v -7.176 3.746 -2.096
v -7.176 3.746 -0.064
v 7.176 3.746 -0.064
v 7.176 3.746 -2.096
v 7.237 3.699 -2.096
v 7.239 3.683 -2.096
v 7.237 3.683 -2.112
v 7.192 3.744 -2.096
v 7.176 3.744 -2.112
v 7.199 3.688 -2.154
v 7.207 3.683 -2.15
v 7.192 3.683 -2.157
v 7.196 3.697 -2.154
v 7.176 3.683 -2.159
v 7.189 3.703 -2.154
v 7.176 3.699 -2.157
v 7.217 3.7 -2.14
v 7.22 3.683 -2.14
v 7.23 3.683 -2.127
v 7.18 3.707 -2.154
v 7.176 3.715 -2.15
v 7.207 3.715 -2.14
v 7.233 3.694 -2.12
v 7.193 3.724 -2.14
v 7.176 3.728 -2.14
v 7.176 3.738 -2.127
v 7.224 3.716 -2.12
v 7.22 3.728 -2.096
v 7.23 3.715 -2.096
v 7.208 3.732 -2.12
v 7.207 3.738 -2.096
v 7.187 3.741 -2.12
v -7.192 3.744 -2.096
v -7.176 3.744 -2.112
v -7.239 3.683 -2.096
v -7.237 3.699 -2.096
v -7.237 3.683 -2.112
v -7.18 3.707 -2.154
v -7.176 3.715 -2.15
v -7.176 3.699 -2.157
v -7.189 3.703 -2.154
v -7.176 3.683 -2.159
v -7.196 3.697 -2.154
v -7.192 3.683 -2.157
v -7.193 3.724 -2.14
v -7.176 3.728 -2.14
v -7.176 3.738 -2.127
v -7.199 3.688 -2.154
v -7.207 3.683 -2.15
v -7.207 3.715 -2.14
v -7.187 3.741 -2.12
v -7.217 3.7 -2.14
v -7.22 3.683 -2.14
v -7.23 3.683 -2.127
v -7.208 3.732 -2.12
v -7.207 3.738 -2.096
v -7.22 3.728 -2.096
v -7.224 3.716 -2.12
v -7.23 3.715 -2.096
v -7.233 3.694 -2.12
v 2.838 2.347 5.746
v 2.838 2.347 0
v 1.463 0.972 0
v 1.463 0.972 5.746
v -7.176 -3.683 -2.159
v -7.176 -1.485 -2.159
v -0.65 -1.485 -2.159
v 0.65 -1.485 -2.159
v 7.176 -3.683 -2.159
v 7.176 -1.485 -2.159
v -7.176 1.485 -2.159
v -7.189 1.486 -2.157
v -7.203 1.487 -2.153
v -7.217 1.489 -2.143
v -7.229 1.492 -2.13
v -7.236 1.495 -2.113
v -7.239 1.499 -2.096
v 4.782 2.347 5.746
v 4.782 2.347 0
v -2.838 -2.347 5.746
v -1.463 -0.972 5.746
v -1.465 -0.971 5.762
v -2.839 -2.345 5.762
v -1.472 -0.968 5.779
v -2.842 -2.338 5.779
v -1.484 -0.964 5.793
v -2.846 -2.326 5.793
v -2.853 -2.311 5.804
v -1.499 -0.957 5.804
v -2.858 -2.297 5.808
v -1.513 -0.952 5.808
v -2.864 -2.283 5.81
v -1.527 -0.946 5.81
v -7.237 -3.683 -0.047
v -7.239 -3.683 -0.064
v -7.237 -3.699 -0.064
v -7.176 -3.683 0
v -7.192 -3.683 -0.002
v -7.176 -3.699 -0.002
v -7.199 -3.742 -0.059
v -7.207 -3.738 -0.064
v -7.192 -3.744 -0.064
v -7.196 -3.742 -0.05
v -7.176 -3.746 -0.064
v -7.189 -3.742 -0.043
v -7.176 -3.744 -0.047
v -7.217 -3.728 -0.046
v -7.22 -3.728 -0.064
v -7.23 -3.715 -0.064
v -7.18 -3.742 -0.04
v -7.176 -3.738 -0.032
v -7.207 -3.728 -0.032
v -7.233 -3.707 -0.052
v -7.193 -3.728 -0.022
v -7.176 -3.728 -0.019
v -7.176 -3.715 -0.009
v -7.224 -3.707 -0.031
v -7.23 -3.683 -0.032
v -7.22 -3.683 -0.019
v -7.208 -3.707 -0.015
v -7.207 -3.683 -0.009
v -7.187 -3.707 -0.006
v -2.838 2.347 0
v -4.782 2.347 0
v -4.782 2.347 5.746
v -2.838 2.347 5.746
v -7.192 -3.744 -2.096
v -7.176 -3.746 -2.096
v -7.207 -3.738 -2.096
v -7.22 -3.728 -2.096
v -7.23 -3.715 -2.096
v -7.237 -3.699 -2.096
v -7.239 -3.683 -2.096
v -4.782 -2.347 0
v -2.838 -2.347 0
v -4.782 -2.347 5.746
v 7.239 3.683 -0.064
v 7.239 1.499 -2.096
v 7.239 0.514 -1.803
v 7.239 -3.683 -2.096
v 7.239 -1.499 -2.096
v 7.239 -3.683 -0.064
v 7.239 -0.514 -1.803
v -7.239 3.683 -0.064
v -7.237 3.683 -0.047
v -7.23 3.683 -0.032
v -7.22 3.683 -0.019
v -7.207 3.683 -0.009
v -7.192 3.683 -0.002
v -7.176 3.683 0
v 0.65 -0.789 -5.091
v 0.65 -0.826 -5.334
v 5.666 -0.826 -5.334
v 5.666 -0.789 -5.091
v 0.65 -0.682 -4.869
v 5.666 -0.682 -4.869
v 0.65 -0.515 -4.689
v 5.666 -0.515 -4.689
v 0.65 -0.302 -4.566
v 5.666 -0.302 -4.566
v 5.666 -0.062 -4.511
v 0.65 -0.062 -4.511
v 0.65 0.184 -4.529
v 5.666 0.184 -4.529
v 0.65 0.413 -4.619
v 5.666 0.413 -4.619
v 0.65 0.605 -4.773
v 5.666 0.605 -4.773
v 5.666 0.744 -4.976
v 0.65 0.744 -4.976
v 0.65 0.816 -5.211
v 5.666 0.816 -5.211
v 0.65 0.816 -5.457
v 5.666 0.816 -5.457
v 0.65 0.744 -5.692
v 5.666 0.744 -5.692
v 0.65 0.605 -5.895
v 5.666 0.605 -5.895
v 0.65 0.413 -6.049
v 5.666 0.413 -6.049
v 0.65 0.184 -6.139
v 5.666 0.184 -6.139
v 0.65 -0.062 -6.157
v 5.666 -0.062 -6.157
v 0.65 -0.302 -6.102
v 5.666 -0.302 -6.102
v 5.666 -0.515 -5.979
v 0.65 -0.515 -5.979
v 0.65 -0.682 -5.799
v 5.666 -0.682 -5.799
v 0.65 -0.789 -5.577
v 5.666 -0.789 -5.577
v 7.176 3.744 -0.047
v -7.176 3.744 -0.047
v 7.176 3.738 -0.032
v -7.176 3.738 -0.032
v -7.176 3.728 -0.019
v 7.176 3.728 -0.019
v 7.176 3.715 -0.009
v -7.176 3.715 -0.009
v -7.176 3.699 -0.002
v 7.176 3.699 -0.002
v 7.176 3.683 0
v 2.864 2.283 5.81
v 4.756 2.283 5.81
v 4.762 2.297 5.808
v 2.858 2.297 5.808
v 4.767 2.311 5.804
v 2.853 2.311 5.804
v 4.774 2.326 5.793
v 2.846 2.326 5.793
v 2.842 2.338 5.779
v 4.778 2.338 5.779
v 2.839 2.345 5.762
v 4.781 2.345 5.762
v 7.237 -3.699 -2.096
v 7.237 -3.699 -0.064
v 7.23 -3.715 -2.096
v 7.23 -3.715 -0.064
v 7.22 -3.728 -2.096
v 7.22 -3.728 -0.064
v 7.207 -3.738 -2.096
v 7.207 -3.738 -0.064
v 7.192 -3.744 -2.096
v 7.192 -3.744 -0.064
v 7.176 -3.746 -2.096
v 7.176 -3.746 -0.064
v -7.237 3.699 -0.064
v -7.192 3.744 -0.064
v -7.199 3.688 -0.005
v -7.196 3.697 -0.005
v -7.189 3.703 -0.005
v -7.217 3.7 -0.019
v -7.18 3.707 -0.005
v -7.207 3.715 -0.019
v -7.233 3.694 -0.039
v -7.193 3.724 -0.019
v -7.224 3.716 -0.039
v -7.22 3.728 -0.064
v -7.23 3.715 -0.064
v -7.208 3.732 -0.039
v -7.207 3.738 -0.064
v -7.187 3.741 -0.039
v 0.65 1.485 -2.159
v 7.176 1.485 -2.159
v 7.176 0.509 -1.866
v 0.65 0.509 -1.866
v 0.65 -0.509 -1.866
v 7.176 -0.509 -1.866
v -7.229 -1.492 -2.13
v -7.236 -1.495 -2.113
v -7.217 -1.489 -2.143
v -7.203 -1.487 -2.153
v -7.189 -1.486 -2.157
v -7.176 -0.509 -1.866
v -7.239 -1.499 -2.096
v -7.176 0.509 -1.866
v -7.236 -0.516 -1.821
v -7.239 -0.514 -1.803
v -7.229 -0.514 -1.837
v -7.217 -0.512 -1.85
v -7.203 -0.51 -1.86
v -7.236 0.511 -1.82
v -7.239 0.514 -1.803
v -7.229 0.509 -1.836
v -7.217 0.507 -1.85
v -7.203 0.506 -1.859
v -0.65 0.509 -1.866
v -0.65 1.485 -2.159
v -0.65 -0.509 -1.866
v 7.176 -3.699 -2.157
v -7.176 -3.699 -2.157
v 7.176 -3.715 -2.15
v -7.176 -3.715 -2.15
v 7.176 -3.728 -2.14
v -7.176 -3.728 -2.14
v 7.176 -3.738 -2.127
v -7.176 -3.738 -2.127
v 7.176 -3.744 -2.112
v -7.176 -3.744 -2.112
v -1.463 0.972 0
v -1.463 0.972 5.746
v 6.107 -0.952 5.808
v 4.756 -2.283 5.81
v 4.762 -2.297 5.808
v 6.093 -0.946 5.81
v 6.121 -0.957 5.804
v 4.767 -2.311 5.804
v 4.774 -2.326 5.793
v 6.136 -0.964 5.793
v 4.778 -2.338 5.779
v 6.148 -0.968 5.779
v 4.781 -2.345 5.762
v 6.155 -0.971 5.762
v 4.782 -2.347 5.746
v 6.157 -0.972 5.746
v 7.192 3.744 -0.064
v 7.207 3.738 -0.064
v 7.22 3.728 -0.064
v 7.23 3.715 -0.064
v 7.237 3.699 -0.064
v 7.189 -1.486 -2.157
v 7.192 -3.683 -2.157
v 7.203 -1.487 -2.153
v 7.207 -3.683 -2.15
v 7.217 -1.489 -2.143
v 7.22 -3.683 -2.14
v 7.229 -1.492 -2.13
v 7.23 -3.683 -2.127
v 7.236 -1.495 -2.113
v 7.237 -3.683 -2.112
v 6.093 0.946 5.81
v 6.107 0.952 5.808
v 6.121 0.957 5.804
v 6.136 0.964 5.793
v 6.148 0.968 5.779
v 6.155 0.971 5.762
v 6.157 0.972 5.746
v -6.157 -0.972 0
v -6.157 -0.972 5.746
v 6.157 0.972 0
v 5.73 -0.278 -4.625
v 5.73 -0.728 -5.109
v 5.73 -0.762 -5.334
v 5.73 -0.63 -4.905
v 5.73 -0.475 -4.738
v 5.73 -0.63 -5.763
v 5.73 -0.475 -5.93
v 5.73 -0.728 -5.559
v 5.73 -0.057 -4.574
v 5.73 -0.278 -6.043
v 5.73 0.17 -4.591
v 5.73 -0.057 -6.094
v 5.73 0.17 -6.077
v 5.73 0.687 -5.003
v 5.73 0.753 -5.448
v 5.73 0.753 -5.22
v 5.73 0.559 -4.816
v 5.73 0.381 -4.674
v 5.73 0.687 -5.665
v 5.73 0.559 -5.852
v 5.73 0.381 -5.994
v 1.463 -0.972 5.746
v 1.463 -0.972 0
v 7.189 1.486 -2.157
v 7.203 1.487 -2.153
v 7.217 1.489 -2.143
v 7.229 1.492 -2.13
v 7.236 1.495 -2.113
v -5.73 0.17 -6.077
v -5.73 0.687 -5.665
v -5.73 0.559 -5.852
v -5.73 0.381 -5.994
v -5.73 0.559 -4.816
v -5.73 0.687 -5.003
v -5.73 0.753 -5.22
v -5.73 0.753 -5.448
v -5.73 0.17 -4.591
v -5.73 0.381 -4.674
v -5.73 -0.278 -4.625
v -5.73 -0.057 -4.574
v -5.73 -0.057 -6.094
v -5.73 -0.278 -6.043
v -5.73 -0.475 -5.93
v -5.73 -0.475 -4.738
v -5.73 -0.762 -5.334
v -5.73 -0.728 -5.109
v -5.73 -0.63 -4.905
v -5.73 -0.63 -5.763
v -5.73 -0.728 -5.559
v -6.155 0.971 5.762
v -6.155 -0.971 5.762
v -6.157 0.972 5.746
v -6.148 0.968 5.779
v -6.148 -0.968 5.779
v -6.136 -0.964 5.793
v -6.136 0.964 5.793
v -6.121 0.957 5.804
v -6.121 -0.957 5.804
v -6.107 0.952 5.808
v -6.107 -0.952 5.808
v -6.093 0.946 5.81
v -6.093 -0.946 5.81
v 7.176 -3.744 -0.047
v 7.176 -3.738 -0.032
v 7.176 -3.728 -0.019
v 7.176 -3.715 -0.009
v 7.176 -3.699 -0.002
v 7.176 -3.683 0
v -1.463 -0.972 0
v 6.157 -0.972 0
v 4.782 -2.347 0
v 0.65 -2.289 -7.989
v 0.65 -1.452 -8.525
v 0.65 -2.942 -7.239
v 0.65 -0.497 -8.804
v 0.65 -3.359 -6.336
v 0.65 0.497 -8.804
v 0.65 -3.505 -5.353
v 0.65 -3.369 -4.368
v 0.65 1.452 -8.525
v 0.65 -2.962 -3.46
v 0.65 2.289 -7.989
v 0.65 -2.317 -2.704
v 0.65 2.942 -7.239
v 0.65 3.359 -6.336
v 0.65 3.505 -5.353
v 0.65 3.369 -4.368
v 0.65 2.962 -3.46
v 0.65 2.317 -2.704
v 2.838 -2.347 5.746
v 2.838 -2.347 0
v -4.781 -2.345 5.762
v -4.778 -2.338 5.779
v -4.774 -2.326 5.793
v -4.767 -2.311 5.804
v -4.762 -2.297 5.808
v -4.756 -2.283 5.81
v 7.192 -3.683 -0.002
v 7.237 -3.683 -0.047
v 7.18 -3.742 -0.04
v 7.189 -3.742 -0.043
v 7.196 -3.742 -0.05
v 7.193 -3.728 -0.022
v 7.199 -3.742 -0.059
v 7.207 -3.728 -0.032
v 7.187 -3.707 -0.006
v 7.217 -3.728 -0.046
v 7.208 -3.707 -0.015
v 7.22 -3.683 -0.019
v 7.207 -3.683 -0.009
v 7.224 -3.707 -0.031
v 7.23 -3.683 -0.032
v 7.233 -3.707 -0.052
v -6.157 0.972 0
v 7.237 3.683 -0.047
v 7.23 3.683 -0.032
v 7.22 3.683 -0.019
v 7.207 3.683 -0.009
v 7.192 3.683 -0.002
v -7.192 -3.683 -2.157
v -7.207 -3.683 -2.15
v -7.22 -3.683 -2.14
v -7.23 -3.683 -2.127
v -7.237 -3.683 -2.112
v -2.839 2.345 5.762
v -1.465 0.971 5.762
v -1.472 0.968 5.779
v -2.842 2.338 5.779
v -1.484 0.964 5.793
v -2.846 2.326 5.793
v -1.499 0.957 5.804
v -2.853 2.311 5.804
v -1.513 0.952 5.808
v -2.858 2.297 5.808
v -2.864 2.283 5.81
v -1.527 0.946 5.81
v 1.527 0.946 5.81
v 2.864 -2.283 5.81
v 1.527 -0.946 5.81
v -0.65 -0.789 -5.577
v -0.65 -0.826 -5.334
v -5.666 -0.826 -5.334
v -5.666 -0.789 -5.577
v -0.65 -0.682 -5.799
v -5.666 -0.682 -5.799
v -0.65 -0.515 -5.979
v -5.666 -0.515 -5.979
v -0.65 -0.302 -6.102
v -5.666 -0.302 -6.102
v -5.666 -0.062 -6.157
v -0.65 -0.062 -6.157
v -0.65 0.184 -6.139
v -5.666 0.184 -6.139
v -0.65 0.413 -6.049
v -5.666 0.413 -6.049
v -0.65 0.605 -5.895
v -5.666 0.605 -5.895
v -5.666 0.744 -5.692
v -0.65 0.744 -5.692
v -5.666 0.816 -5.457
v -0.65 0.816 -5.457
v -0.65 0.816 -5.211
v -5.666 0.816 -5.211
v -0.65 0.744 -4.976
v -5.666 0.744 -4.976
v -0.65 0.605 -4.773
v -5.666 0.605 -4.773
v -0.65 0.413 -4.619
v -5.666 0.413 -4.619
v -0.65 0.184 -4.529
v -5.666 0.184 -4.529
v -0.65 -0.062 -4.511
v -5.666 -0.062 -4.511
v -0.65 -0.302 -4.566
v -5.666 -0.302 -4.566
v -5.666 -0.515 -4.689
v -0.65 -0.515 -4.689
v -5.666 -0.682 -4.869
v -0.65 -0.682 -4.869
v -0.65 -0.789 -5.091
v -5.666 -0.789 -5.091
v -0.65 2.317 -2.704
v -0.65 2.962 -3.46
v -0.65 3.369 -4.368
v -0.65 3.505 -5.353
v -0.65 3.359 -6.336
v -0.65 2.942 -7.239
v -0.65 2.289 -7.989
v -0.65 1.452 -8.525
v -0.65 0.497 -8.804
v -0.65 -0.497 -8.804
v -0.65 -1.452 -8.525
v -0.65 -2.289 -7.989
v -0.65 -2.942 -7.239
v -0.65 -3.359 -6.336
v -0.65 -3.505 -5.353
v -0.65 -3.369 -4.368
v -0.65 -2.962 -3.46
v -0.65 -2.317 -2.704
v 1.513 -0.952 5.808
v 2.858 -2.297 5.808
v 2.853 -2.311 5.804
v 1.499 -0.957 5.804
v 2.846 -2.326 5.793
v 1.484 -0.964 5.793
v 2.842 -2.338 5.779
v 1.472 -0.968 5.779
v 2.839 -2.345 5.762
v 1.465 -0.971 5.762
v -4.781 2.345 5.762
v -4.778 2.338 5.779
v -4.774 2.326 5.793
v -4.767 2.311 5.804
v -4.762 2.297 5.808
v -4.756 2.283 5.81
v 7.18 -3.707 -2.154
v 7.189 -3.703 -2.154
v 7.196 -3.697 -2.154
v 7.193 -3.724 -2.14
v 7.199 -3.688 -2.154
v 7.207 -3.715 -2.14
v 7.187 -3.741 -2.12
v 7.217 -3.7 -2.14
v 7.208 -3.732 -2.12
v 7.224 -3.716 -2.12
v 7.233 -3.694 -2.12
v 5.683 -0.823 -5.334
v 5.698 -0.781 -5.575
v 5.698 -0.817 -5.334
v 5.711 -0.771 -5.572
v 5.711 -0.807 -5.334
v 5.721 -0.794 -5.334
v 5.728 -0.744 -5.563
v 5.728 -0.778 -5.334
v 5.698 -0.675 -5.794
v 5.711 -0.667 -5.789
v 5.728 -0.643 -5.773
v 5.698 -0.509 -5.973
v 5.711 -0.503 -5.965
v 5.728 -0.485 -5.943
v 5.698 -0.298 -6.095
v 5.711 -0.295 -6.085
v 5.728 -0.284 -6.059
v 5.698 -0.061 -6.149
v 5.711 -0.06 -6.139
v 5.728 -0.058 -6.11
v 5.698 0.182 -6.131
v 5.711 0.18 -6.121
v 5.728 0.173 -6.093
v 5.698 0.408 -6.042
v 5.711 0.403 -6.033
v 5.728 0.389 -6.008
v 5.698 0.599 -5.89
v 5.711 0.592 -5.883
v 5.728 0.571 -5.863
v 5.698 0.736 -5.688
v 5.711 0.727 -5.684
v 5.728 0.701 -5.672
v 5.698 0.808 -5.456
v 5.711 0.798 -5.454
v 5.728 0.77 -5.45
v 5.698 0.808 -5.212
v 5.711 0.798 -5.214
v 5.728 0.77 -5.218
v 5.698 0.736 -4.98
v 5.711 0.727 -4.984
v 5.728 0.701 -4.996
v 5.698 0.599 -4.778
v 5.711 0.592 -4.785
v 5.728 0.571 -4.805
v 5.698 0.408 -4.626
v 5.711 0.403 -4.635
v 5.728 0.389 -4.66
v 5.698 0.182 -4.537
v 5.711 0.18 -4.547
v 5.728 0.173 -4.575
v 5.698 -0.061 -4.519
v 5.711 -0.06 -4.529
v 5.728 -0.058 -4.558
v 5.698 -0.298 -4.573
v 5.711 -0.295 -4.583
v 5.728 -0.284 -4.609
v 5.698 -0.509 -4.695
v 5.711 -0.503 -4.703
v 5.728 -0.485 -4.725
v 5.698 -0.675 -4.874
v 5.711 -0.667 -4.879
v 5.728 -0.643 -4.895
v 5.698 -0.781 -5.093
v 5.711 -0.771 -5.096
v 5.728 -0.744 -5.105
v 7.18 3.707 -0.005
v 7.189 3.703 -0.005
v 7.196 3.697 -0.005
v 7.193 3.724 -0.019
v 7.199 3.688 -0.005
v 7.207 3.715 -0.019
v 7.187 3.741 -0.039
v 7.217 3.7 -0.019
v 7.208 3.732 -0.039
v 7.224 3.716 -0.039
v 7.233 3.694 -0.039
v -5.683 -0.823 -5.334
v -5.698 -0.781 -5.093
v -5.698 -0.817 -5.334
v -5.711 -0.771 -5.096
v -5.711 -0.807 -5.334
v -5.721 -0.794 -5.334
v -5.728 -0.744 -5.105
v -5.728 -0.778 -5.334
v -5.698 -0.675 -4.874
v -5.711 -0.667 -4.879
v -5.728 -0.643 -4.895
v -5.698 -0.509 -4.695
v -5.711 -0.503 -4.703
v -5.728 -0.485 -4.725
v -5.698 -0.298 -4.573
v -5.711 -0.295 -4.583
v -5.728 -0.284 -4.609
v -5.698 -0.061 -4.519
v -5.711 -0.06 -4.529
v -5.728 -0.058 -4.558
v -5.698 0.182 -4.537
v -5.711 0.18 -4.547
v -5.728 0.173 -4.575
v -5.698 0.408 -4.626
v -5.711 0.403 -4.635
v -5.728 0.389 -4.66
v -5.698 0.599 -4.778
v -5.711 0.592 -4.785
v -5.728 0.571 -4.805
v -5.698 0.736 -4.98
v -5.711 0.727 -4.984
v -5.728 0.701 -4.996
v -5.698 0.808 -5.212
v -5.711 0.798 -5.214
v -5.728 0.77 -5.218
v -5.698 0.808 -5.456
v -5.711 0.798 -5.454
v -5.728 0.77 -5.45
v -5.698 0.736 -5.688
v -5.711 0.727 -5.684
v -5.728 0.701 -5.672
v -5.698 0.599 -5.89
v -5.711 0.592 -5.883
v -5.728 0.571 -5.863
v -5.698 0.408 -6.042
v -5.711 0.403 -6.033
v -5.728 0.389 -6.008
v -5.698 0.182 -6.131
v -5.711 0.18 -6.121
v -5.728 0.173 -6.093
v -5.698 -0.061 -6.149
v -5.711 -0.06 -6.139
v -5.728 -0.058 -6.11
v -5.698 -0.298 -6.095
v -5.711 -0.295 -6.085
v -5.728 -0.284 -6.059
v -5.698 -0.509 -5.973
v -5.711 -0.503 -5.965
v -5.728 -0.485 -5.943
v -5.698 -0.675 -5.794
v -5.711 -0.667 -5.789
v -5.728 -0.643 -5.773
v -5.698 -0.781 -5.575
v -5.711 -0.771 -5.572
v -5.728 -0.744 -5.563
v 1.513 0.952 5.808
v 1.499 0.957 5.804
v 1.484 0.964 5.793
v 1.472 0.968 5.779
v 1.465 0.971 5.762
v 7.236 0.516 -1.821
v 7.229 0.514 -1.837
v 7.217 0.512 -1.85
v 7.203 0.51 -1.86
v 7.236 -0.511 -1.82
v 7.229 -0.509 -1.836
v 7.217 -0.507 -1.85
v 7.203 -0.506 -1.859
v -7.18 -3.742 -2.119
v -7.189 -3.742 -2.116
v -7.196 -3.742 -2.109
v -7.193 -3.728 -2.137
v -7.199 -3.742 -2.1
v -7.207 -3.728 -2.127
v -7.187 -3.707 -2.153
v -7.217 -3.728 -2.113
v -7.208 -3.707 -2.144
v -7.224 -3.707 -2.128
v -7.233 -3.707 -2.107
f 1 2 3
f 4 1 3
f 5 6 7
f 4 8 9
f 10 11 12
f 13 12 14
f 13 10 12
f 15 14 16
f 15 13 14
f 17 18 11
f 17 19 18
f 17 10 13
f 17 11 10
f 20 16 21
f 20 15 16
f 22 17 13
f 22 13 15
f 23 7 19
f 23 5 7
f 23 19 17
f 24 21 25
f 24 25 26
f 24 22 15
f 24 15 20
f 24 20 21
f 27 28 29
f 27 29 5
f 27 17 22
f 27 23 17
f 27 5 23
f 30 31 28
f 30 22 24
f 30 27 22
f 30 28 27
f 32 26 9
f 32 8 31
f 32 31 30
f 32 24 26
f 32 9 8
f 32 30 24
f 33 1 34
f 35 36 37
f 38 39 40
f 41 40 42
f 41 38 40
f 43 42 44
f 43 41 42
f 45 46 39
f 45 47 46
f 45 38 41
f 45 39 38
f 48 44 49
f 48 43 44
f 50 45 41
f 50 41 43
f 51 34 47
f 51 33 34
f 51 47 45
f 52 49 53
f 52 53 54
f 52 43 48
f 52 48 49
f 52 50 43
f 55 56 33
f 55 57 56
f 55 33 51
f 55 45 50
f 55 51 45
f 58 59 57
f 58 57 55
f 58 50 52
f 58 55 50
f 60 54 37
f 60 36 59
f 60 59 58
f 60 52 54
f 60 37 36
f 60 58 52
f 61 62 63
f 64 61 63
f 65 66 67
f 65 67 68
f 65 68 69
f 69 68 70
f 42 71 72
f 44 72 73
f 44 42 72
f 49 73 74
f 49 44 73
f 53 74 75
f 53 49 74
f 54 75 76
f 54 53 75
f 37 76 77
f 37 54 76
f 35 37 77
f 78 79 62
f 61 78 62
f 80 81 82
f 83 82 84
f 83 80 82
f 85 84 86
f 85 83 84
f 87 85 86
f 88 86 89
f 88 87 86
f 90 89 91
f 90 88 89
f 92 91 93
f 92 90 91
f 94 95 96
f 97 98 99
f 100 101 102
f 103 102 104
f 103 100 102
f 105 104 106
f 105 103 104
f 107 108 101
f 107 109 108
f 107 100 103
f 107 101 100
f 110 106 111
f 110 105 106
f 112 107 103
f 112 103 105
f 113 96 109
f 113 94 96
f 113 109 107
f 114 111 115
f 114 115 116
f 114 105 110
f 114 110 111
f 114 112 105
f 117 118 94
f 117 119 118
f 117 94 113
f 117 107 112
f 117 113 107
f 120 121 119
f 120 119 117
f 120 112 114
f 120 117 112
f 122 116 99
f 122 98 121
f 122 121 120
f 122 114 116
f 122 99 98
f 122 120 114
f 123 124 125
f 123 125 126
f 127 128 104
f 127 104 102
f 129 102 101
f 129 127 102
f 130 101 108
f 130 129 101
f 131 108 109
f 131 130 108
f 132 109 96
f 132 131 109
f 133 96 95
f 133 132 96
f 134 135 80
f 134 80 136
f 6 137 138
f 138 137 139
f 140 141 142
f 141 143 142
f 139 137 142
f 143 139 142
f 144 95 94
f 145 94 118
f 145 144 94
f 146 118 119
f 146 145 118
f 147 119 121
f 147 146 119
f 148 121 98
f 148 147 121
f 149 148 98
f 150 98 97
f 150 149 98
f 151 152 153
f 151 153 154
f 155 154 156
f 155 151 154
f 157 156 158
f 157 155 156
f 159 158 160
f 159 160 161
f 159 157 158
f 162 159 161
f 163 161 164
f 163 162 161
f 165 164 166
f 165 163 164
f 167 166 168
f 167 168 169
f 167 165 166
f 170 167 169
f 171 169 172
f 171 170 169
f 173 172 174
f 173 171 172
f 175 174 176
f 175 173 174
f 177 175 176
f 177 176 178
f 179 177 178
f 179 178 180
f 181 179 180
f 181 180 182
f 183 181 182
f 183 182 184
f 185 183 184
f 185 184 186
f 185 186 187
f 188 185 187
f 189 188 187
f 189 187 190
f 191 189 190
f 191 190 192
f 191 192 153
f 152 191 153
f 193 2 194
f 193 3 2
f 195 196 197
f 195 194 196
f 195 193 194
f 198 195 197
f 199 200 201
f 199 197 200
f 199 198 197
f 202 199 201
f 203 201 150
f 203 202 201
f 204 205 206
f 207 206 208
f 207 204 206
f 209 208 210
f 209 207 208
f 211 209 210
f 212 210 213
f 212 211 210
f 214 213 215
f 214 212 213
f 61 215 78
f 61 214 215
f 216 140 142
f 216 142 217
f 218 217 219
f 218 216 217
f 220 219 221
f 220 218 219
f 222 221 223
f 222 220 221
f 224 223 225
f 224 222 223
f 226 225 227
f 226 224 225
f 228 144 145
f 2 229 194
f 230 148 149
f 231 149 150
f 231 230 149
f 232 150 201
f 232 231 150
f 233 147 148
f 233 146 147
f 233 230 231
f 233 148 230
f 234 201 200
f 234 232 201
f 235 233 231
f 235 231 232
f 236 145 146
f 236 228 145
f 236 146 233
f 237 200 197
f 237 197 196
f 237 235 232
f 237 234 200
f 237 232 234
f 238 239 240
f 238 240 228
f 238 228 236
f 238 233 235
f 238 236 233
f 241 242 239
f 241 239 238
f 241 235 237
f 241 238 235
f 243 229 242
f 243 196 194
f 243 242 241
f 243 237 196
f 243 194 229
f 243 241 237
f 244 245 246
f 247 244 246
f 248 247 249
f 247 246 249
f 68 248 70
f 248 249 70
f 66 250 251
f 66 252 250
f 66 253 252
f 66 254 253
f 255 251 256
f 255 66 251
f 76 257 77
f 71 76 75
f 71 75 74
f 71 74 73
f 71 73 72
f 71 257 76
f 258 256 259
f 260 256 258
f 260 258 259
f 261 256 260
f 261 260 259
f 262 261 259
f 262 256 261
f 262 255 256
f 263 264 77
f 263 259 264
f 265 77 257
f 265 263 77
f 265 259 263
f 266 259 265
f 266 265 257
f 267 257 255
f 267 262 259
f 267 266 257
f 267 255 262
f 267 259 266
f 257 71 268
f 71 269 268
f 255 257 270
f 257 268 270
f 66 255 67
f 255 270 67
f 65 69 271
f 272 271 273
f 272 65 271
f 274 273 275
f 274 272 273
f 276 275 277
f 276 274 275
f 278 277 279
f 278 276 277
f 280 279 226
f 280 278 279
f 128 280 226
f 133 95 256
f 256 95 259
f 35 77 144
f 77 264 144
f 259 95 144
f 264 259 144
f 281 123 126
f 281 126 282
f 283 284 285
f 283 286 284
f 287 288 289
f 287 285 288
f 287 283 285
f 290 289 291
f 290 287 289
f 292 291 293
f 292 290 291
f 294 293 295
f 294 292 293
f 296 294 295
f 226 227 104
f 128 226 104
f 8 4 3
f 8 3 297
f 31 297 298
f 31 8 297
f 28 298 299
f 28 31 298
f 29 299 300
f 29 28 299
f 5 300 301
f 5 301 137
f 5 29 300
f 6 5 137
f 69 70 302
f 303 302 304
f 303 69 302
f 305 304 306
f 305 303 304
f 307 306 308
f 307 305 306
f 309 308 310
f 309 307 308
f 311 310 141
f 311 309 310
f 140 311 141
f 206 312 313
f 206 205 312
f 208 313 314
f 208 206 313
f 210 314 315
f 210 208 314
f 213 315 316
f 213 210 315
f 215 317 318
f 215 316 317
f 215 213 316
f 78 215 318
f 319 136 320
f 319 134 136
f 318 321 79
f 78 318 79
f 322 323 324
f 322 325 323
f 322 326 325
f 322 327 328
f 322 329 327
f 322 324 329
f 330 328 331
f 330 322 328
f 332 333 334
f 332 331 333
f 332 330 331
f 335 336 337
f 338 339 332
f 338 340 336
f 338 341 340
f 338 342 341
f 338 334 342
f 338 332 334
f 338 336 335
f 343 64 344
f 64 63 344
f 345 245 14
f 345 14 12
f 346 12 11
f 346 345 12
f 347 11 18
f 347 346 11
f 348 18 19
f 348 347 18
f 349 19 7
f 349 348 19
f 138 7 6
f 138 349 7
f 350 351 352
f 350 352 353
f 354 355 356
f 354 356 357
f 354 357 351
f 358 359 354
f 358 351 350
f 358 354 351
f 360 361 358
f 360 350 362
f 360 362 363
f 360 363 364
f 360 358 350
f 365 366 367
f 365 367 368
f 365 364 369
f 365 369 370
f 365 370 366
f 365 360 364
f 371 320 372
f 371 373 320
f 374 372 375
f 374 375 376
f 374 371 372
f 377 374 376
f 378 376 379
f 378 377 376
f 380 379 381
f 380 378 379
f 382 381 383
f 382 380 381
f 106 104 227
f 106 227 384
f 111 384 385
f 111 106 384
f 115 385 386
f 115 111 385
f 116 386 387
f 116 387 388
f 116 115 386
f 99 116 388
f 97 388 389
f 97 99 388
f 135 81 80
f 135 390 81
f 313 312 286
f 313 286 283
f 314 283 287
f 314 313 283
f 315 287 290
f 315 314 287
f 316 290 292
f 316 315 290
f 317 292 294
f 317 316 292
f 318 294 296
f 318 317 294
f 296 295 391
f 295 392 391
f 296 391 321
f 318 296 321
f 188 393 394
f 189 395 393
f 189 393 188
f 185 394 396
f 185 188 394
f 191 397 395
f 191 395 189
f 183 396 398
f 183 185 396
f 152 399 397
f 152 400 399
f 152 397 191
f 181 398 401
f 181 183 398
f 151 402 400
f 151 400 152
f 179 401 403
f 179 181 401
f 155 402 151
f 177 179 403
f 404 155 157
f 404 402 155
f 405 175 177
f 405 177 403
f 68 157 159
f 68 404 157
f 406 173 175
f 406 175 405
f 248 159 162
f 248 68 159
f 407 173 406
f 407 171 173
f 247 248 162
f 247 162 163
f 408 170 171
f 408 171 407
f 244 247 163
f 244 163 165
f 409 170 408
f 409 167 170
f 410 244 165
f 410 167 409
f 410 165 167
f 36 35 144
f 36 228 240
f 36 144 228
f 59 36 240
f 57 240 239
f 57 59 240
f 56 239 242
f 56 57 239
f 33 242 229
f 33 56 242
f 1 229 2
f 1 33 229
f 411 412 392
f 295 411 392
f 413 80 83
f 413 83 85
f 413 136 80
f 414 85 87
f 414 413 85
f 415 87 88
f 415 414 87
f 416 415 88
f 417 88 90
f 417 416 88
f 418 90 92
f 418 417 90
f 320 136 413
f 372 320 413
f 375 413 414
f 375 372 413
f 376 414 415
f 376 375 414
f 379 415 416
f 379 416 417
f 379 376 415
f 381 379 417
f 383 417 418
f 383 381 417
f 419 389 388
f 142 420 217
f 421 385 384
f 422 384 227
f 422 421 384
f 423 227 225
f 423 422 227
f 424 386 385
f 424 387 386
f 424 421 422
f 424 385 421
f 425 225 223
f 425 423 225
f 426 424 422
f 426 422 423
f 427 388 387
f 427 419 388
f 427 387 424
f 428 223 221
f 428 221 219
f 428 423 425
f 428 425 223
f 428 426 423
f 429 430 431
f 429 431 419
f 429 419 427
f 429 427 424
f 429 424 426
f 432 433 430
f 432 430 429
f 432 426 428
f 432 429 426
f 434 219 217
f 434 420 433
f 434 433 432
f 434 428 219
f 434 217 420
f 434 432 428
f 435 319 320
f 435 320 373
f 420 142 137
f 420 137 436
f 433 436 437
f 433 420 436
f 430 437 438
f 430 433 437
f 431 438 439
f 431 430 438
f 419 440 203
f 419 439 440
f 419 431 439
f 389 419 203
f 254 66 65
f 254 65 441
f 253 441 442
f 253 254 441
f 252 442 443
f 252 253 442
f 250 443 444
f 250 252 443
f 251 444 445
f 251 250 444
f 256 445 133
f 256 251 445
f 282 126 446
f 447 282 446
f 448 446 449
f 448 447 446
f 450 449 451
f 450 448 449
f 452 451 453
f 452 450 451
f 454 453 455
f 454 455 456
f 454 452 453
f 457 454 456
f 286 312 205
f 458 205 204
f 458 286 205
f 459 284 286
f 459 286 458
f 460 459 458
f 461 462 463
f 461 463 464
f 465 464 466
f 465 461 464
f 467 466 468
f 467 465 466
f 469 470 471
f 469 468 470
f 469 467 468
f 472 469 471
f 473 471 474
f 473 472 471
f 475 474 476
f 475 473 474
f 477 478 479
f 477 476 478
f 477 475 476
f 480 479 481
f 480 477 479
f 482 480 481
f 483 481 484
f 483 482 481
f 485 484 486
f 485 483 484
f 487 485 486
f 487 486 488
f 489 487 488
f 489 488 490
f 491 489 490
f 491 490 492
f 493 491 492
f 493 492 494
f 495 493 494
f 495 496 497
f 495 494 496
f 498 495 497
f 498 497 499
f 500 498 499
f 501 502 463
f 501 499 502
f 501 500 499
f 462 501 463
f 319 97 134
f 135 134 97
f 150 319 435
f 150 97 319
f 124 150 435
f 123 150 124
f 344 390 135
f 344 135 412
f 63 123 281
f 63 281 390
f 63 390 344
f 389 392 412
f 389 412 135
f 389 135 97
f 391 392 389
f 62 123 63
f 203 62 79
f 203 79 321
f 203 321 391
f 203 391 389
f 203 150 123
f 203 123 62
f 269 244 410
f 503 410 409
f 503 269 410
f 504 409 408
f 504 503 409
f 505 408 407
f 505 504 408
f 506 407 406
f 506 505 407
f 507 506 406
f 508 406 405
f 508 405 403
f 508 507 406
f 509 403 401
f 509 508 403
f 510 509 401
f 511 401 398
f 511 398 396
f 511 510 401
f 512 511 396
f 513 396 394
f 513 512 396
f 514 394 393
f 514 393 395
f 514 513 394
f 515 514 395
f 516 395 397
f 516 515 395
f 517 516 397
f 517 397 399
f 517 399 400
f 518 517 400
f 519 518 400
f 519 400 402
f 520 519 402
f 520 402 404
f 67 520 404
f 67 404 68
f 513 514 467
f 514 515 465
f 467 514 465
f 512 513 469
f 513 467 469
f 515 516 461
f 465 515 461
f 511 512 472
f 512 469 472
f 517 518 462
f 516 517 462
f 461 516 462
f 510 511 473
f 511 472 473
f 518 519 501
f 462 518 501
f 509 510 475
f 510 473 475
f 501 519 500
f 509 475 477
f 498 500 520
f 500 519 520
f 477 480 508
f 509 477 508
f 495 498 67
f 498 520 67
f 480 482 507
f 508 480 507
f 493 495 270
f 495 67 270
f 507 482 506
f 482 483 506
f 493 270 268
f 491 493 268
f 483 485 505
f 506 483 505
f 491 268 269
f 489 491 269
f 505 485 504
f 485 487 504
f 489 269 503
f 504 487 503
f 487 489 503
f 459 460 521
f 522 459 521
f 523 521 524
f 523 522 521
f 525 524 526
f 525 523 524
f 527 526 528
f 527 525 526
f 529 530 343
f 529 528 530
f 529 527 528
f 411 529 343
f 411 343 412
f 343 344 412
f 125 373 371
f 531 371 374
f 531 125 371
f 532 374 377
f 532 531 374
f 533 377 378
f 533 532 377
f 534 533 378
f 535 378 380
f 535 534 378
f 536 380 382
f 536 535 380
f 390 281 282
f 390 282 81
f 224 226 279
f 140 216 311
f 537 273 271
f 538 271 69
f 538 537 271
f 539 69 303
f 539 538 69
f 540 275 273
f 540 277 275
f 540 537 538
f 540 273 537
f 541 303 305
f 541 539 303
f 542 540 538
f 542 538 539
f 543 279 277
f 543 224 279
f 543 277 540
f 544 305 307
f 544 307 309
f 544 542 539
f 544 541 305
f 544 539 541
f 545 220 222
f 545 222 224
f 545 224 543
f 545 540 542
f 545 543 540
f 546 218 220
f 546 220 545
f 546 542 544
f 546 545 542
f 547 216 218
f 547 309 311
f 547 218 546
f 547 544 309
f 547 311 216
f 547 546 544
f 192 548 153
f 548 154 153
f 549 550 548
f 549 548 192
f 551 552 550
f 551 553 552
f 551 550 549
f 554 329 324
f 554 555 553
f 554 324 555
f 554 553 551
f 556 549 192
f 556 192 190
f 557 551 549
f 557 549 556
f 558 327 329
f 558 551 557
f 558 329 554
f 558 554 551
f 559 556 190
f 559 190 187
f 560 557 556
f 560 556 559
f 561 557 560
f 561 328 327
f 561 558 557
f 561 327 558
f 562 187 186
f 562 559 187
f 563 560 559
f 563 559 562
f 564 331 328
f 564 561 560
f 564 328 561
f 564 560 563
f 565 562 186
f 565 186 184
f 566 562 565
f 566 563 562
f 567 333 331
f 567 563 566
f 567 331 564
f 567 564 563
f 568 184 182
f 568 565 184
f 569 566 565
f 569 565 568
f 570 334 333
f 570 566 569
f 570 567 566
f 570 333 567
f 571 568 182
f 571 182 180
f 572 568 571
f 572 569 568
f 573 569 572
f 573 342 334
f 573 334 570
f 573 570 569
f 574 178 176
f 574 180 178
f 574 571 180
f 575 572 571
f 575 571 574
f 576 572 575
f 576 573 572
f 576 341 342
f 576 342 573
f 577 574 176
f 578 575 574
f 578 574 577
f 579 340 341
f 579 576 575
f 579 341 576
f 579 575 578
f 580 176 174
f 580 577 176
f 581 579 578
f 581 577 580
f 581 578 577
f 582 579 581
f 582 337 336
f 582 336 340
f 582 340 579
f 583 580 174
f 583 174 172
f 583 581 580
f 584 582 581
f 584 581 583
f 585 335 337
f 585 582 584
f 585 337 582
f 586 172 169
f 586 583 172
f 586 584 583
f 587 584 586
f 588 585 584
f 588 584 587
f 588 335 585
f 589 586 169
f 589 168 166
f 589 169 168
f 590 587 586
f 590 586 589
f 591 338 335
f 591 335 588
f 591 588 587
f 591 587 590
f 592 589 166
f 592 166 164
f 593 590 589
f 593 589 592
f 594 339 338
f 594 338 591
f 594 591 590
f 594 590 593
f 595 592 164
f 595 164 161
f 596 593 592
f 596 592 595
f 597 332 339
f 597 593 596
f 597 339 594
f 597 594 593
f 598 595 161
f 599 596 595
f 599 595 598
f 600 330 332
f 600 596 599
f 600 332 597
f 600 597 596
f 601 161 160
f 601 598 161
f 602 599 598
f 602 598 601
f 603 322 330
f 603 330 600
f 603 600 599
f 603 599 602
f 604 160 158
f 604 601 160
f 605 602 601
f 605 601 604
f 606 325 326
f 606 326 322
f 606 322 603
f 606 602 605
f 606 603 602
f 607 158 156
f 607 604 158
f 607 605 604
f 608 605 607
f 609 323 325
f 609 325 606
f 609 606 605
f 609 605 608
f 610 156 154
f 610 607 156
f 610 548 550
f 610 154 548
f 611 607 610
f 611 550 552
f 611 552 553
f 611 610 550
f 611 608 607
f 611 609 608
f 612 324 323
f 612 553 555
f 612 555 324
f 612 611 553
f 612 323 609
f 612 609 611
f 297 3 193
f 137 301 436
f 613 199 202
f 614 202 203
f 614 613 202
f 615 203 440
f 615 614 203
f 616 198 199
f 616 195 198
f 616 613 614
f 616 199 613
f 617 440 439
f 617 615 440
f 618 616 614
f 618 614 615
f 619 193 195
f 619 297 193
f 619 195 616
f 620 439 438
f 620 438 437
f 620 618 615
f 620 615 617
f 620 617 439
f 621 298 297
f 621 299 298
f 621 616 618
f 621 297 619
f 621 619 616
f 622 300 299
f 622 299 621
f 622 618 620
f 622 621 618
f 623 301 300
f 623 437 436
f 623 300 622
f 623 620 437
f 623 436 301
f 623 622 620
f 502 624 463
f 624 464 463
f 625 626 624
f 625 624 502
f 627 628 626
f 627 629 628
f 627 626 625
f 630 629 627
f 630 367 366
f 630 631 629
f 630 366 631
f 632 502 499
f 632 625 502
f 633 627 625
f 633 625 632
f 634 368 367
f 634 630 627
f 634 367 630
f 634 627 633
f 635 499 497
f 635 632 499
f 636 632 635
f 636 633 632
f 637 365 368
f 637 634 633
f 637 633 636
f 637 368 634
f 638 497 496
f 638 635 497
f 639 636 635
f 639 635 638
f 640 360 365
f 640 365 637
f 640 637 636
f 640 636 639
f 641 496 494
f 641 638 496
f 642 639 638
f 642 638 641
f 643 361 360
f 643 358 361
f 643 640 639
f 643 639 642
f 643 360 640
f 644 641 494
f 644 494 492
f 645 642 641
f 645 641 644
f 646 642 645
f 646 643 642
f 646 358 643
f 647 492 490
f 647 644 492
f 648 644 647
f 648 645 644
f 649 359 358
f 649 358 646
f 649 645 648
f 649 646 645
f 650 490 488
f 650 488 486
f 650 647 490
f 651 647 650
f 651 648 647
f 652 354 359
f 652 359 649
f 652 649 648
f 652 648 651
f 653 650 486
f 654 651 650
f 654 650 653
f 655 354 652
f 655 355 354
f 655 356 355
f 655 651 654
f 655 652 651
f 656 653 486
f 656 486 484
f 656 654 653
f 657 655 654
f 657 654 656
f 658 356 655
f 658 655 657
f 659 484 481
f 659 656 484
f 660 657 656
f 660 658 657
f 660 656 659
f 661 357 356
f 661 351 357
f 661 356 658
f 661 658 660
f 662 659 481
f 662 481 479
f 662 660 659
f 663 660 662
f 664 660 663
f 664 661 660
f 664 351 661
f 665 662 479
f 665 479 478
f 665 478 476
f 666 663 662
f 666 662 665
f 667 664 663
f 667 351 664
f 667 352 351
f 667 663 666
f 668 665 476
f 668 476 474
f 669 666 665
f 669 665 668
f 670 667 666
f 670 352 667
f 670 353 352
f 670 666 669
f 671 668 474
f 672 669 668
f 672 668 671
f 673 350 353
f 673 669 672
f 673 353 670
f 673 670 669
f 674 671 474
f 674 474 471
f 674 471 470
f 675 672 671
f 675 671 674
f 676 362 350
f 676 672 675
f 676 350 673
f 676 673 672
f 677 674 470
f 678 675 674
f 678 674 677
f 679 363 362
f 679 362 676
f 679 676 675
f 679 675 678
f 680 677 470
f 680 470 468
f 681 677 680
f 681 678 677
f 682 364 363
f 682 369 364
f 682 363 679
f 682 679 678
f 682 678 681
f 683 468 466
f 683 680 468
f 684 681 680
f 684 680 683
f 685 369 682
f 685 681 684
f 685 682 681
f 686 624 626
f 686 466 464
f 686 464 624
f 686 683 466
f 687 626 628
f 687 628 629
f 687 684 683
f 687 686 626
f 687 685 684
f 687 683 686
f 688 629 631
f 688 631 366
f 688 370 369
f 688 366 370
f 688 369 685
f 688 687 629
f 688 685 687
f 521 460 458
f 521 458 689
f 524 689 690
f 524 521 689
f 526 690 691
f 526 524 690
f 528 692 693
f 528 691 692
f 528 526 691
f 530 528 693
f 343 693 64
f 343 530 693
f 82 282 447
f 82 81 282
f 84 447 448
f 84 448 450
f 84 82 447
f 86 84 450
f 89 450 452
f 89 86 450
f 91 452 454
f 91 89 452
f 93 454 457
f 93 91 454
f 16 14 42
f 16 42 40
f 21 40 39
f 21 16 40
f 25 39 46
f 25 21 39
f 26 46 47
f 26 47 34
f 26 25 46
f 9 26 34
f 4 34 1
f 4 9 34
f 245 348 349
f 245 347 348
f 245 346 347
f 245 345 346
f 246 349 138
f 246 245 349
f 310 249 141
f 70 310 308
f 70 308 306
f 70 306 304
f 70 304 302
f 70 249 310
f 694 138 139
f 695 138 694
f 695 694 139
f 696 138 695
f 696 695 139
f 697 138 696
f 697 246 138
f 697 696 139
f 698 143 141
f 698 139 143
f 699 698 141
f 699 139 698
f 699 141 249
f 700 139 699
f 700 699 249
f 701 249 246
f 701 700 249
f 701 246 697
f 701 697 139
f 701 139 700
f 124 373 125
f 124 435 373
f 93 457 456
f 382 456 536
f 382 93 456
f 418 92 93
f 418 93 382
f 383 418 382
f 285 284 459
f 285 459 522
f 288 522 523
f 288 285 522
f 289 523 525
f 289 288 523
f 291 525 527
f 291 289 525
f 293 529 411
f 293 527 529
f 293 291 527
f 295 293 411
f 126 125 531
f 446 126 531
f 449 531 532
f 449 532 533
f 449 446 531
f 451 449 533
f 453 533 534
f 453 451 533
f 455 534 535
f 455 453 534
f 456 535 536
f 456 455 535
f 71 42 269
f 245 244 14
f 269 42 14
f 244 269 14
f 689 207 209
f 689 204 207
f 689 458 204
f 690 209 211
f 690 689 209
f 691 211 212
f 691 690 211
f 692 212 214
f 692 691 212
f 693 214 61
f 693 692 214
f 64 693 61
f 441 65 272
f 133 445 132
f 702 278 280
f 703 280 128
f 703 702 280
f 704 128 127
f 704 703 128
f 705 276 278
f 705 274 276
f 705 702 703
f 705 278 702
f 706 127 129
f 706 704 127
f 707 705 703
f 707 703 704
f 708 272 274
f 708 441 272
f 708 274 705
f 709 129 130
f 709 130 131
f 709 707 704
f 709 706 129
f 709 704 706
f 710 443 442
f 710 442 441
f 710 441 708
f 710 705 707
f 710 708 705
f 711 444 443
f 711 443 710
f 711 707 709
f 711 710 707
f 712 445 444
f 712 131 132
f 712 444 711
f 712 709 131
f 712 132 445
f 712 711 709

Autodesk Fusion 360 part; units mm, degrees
sketch "Baseplate" plane through (0, 0, 0) normal (0, 0, 1) x (1, 0, 0)
  line L0 (-7.239, 3.7465) -> (7.239, 3.7465)
  line L1 (7.239, 3.7465) -> (7.239, -3.7465)
  line L2 (7.239, -3.7465) -> (-7.239, -3.7465)
  line L3 (-7.239, -3.7465) -> (-7.239, 3.7465)
  line L4 (-7.239, 3.7465) -> (7.239, -3.7465) construction
  line L5 (7.239, 3.7465) -> (-7.239, -3.7465) construction
  dimension "d1" = 14.478
  dimension "d2" = 7.493
extrude "Extrude1" add sketch "Baseplate" against normal blind 2.159
sketch "UpperJoint" plane through (0, 0, 0) normal (0, 0, 1) x (-1, 0, 0)
  line L0 (7.239, 3.7465) -> (-7.239, 3.7465)
  line L1 (-7.239, 3.7465) -> (-7.239, -3.7465)
  line L2 (-7.239, -3.7465) -> (7.239, -3.7465)
  line L3 (7.239, -3.7465) -> (7.239, 3.7465)
  circle A0 centre (-3.81, 0) radius 2.54 construction
  line L4 (-4.782, -2.3467) -> (-2.838, -2.3467)
  line L5 (-2.838, -2.3467) -> (-1.4633, -0.972)
  line L6 (-1.4633, -0.972) -> (-1.4633, 0.972)
  line L7 (-1.4633, 0.972) -> (-2.838, 2.3467)
  line L8 (-2.838, 2.3467) -> (-4.782, 2.3467)
  line L9 (-4.782, 2.3467) -> (-6.1567, 0.972)
  line L10 (-6.1567, 0.972) -> (-6.1567, -0.972)
  line L11 (-6.1567, -0.972) -> (-4.782, -2.3467)
  line L12 (0, -2.5) -> (0, -20)
  line L13 (2.838, 2.3467) -> (4.782, 2.3467)
  line L14 (4.782, 2.3467) -> (6.1567, 0.972)
  line L15 (6.1567, 0.972) -> (6.1567, -0.972)
  line L16 (6.1567, -0.972) -> (4.782, -2.3467)
  line L17 (4.782, -2.3467) -> (2.838, -2.3467)
  line L18 (2.838, -2.3467) -> (1.4633, -0.972)
  line L19 (1.4633, -0.972) -> (1.4633, 0.972)
  line L20 (1.4633, 0.972) -> (2.838, 2.3467)
  point P0 (-3.81, 0)
  dimension "d5" = 5.08
  dimension "d7" = 3.81
extrude "Extrude2" add sketch "UpperJoint" along normal blind 5.81 contours L4 L5 L6 L7 L8 L9 L10 L11 | L13 L14 L15 L16 L17 L18 L19 L20
sketch "LegJoints" plane through (0, 0, 0) normal (1, 0, 0) x (0, 1, 0)
  circle A0 centre (0, -5.334) radius 3.5052
  dimension "d10" = 7.0104
  dimension "d11" = 5.334
extrude "Extrude3" cut sketch "LegJoints" along normal mid plane 20
extrude "Extrude4" add sketch "LegJoints" along normal mid plane 1.3
sketch "LegJoints2" plane through (-0.65, 0, 0) normal (-1, 0, 0) x (0, -1, 0)
  arc A0 (-1.4852, -2.159) -> (1.4852, -2.159) centre (0, -5.334) ccw
  arc A1 (1.4852, -2.159) -> (-1.4852, -2.159) centre (0, -5.334) ccw
  circle A2 centre (0, -5.334) radius 0.8255
  dimension "d16" = 1.651
extrude "Extrude5" add sketch "LegJoints2" along normal blind 5.08 contours A2
mirror "Mirror1" about plane through (0, 0, 0) normal (1, 0, 0) of "Extrude5"
fillet "Fillet1" radius 0.0635 2 edges at (5.73, 0.7696, -5.6325) (-5.73, 0.7696, -5.6325) 6 faces at (4.5922, 0.324, 5.81) (-3.0278, -0.324, 5.81) (2.413, 3.7465, -1.4393) (-7.239, 0, -0.6096) (7.239, 0, -0.6096) (-2.413, -3.7465, -1.4393)
